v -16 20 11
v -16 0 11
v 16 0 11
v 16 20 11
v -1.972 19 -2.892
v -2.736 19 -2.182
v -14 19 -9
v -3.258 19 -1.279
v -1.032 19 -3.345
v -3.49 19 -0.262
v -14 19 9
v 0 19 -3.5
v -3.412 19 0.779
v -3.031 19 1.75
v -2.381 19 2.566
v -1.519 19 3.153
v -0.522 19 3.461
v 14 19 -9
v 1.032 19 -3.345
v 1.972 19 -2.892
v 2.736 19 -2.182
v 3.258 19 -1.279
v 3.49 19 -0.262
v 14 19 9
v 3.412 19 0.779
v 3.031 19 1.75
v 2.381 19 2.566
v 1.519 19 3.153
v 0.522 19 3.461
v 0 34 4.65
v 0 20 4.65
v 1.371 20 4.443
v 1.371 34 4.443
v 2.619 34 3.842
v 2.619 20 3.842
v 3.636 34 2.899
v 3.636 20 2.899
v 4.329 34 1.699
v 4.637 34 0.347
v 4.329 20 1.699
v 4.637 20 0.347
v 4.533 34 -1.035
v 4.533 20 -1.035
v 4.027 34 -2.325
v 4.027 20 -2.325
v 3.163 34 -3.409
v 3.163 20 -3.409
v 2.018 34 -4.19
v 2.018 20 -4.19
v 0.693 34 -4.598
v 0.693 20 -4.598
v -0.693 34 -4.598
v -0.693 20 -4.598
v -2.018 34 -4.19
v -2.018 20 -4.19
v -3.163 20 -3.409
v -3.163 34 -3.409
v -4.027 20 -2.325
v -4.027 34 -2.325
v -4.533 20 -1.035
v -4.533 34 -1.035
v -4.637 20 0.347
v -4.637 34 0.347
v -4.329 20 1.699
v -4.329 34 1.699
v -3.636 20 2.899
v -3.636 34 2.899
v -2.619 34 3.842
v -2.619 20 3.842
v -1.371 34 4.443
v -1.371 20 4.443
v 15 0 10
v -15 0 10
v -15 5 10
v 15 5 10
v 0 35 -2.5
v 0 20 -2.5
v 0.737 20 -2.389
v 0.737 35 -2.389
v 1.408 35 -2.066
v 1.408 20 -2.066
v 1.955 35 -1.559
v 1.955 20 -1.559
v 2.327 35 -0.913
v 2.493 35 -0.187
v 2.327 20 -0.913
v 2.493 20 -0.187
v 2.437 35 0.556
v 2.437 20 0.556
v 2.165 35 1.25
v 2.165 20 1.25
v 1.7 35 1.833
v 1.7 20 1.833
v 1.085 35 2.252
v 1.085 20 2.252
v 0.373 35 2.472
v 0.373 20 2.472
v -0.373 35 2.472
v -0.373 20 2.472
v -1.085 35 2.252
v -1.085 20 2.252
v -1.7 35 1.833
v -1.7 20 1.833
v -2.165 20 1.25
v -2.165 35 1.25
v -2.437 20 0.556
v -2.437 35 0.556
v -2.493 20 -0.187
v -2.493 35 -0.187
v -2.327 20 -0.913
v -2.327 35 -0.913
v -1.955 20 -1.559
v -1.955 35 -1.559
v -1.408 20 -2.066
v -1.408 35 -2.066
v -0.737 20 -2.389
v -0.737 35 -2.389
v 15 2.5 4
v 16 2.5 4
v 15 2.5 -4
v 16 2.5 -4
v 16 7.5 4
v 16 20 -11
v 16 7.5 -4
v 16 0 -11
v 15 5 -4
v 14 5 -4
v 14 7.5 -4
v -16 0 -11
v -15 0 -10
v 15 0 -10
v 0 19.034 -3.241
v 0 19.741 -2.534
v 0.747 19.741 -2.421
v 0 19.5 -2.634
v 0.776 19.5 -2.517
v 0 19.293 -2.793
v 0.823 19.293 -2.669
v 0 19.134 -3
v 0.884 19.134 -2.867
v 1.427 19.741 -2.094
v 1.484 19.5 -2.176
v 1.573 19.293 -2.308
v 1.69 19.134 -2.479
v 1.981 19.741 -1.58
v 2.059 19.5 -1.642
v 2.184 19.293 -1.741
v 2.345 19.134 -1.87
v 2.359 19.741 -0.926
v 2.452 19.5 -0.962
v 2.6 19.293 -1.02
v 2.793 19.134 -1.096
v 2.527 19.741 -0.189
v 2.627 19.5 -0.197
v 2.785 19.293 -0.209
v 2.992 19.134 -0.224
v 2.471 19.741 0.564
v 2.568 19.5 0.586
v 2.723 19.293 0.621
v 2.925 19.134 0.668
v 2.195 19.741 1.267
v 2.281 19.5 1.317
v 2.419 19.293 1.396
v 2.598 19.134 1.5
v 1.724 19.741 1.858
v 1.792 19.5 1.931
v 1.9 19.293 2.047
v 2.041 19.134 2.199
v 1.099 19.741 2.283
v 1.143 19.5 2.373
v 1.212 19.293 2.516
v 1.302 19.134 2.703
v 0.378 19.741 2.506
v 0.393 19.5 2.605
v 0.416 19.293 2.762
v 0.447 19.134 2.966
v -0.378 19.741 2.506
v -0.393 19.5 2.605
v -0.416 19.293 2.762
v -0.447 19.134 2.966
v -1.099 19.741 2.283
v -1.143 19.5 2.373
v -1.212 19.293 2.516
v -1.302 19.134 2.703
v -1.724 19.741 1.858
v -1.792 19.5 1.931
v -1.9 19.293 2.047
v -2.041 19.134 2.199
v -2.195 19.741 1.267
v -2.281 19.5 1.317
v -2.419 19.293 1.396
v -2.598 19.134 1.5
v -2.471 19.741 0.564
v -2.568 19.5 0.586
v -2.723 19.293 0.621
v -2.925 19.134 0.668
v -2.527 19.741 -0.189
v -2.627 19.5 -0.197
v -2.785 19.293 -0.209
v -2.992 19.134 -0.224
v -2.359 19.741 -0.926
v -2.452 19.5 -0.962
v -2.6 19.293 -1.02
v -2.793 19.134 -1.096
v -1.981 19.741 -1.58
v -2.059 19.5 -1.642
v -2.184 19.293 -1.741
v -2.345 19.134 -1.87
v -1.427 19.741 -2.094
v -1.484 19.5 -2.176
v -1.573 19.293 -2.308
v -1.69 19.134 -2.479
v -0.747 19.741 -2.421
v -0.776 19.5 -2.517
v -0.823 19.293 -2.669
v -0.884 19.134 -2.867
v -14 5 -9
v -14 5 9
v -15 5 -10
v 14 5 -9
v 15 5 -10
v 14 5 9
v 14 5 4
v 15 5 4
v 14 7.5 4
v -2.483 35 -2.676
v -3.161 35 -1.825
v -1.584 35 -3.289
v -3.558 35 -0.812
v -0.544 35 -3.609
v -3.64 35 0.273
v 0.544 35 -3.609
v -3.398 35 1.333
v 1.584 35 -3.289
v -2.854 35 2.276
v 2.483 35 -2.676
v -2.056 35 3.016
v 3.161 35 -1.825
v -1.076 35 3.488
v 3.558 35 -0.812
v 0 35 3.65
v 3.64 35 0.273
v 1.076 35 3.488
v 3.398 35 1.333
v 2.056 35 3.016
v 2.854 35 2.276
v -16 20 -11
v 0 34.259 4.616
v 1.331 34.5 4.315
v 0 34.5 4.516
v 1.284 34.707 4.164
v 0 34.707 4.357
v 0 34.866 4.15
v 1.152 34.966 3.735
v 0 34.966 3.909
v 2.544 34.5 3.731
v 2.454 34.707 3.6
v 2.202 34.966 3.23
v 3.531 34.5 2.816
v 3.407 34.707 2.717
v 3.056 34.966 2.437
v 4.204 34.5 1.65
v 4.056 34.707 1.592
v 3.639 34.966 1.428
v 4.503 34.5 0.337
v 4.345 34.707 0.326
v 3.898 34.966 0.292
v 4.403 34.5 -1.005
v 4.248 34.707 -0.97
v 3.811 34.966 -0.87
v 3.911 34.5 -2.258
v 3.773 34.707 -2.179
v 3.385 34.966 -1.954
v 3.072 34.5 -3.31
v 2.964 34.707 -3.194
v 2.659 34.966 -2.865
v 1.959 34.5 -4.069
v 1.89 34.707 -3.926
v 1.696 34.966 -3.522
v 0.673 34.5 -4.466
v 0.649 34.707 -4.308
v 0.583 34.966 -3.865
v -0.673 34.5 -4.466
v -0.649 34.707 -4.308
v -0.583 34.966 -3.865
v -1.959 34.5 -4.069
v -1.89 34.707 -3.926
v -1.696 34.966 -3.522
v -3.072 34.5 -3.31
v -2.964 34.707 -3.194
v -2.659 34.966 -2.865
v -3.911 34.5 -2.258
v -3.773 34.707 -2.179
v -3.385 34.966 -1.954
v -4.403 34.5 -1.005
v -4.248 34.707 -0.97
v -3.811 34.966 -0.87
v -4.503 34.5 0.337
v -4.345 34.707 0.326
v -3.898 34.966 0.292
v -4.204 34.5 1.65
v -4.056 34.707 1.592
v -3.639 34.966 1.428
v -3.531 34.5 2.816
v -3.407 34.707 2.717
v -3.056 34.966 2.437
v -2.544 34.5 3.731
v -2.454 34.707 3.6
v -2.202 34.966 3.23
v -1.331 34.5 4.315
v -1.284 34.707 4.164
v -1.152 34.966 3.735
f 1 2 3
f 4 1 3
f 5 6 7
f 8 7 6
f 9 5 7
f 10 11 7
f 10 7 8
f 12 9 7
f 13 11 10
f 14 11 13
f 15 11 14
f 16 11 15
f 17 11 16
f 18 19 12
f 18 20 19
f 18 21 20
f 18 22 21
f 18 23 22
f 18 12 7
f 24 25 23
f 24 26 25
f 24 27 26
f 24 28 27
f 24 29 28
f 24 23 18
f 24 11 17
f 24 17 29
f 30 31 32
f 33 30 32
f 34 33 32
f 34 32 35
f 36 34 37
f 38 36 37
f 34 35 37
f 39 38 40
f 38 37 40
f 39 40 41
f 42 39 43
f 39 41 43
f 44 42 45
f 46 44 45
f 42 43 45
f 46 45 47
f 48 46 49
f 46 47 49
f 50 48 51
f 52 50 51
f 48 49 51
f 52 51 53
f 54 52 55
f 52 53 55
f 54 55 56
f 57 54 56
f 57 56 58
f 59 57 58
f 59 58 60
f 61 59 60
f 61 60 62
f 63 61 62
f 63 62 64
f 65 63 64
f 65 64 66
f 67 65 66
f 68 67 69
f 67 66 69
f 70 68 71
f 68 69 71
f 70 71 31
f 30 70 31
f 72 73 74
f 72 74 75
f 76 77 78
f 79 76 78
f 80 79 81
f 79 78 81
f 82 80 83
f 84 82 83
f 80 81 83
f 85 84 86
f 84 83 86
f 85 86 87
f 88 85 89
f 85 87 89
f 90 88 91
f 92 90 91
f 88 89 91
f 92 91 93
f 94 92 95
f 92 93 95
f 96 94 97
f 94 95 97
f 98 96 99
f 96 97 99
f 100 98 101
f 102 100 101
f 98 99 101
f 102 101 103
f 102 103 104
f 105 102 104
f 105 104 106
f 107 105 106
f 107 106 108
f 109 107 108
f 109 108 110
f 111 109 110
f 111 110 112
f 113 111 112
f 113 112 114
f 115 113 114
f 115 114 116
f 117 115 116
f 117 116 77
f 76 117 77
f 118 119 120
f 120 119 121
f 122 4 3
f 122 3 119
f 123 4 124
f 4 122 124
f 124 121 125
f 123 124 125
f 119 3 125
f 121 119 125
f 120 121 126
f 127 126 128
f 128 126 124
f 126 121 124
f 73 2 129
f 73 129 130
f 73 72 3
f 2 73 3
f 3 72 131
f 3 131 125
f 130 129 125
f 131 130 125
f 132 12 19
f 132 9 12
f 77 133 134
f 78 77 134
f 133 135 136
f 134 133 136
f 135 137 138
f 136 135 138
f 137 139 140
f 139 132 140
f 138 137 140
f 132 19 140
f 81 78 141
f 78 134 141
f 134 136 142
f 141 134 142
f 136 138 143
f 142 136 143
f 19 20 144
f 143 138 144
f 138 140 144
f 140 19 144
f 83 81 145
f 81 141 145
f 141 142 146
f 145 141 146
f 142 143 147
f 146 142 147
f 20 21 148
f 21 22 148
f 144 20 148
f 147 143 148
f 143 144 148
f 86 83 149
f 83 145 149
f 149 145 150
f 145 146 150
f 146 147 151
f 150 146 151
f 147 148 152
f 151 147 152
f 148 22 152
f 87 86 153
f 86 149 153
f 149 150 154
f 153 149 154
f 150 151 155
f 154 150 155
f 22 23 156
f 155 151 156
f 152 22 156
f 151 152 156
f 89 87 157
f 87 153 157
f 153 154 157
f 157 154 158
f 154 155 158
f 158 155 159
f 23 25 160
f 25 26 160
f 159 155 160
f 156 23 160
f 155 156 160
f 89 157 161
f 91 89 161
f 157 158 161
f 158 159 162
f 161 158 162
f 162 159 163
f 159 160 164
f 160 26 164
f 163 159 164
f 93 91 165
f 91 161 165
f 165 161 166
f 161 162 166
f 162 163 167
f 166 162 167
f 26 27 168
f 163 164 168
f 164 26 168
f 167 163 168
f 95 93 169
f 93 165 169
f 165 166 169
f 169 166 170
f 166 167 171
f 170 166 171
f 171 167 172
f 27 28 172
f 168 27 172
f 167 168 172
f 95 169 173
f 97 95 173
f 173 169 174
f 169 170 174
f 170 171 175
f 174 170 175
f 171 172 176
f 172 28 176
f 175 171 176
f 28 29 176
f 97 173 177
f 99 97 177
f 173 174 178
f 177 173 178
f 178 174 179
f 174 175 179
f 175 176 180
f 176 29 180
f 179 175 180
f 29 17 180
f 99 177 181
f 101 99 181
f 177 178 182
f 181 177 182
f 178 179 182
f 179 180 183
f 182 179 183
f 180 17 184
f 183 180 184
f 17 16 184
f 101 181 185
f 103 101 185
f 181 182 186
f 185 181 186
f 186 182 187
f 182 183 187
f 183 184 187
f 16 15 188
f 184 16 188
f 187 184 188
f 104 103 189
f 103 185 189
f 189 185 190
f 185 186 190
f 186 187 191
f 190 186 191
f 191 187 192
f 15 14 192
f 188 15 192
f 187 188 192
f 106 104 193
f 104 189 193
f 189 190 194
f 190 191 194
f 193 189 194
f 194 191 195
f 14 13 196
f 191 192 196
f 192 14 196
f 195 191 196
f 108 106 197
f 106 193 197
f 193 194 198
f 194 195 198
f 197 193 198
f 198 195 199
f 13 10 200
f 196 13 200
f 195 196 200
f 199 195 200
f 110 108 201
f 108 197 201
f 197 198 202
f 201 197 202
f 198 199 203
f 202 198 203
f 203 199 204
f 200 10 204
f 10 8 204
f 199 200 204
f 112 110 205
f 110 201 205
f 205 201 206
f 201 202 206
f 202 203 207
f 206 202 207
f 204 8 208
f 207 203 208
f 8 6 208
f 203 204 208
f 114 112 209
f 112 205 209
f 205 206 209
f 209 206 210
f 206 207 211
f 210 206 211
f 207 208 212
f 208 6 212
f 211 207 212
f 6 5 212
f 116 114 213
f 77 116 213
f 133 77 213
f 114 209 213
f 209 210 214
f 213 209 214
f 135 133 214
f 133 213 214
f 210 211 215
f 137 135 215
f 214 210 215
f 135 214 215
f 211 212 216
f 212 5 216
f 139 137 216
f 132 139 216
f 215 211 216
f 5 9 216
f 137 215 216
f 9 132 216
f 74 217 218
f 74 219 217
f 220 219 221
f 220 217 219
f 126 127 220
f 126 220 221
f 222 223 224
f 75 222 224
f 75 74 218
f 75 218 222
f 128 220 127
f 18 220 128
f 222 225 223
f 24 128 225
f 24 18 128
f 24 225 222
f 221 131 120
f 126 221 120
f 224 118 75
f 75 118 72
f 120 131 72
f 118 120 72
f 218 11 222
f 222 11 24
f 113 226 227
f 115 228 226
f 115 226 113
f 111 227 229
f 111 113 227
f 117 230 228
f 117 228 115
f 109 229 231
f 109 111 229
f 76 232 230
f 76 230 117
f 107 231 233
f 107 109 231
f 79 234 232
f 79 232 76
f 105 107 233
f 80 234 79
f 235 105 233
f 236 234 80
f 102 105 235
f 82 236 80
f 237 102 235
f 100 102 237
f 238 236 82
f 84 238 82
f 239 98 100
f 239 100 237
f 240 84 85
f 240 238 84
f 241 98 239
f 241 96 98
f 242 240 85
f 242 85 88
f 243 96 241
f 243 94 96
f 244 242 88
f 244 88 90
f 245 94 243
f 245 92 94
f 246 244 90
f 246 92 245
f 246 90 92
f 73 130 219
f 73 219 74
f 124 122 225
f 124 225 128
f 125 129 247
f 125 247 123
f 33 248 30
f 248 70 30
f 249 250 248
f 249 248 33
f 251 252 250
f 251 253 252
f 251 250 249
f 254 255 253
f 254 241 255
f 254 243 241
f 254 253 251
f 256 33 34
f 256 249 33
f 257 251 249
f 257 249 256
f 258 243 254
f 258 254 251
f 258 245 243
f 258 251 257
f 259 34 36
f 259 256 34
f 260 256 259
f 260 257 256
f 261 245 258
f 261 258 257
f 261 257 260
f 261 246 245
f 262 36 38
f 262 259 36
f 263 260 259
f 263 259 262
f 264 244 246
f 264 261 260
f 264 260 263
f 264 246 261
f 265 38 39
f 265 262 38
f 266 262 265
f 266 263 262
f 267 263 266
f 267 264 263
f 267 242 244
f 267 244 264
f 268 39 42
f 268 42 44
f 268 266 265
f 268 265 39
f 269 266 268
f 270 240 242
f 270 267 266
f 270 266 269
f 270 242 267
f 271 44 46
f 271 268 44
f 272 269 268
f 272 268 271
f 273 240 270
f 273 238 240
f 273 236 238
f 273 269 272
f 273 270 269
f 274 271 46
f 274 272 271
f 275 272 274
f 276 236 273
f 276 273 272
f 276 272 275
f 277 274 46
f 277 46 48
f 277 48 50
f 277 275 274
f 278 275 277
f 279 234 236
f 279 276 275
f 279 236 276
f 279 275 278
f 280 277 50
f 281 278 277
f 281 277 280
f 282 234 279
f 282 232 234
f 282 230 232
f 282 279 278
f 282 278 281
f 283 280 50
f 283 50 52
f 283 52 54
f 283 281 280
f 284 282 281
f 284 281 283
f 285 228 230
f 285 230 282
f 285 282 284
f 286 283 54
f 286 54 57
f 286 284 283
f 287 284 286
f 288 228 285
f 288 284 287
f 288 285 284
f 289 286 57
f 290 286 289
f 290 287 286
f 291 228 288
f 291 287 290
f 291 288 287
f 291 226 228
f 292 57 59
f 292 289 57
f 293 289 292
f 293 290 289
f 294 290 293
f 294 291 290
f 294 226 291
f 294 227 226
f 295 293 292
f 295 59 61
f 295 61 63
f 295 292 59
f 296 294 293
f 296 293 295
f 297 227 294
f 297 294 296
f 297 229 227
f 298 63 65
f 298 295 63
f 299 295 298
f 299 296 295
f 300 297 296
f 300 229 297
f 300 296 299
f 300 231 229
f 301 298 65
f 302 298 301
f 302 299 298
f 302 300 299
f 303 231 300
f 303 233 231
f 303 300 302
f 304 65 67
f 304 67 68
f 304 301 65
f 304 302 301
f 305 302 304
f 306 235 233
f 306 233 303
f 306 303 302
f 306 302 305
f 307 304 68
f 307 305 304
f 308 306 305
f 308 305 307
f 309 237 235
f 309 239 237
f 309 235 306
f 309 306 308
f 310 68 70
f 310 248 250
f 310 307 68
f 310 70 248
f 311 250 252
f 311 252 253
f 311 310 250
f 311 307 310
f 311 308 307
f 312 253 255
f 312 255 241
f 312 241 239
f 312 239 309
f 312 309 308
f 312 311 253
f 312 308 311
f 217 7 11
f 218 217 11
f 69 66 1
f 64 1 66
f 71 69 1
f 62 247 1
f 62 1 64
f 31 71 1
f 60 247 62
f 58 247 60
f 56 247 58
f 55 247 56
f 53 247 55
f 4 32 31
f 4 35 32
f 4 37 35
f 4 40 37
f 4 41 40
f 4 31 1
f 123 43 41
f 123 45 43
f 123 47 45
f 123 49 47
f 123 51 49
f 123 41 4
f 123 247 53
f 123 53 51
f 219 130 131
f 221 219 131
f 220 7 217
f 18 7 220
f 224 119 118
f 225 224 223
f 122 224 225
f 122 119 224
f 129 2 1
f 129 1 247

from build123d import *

# Parameters (mm, degrees)
SKETCH1_W           = 32
SKETCH1_H           = 22
BOSS_EXTRUDE1_DEPTH = 20
SKETCH2_R           = 4.65
BOSS_EXTRUDE2_DEPTH = 15
SKETCH3_W           = 30
SKETCH3_H           = 20
CUT_EXTRUDE1_DEPTH  = 19
SKETCH4_R           = 2.5
CUT_EXTRUDE2_DEPTH  = 28.166155414
FILLET1_R           = 1
FILLET2_R           = 1
SKETCH5_W           = 30
SKETCH5_H           = 20
SKETCH5_W_2         = 28
SKETCH5_H_2         = 18
BOSS_EXTRUDE3_DEPTH = 14
CUT_EXTRUDE3_REACH  = 50.683
SKETCH8_W           = 8
SKETCH8_H           = 5


with BuildPart() as part:
    # Sketch1 → Boss-Extrude1 (new body)
    with BuildSketch(Plane(origin=(0, 0, 0), x_dir=(1, 0, 0), z_dir=(0, 1, 0))):
        Rectangle(SKETCH1_W, SKETCH1_H)
    extrude(amount=BOSS_EXTRUDE1_DEPTH)

    # Sketch2 → Boss-Extrude2 (add)
    with BuildSketch(Plane(origin=(0, 20, 0), x_dir=(1, 0, 0), z_dir=(0, 1, 0))):
        with Locations(Location((0, 0, 0), (0, 0, 270))):
            Circle(SKETCH2_R)
    extrude(amount=BOSS_EXTRUDE2_DEPTH)

    # Sketch3 → Cut-Extrude1 (cut)
    with BuildSketch(Plane.XZ):
        Rectangle(SKETCH3_W, SKETCH3_H)
    extrude(amount=-CUT_EXTRUDE1_DEPTH, mode=Mode.SUBTRACT)

    # Sketch4 → Cut-Extrude2 (cut, through all)
    with BuildSketch(Plane.XZ.offset(-19)):
        with Locations(Location((0, 0, 0), (0, 0, 270))):
            Circle(SKETCH4_R)
    extrude(amount=-CUT_EXTRUDE2_DEPTH, mode=Mode.SUBTRACT)

    # Fillet1
    fillet1_edges = [part.edges().sort_by_distance(p)[0] for p in [
        (0, 35, -4.65),
    ]]
    fillet(fillet1_edges, radius=FILLET1_R)

    # Fillet2
    fillet2_edges = [part.edges().sort_by_distance(p)[0] for p in [
        (0, 19, 2.5),
    ]]
    fillet(fillet2_edges, radius=FILLET2_R)

    # Sketch5 → Boss-Extrude3 (add)
    with BuildSketch(Plane.XZ.offset(-19)):
        Rectangle(SKETCH5_W, SKETCH5_H)
        Rectangle(SKETCH5_W_2, SKETCH5_H_2, mode=Mode.SUBTRACT)
    extrude(amount=BOSS_EXTRUDE3_DEPTH)

    # Cut-Extrude3: up to this face of the body (flat: up to its plane)
    cut_extrude3_end = Plane(part.part.faces().sort_by_distance((14, 12, 0))[0])
    # Sketch8 → Cut-Extrude3 (cut, up to the picked face)
    with BuildSketch(Plane(origin=(16, 0, 0), x_dir=(0, 0, -1), z_dir=(1, 0, 0)), mode=Mode.PRIVATE) as cut_extrude3_sk1:
        with Locations((0, 5)):
            Rectangle(SKETCH8_W, SKETCH8_H)
    cut_extrude3_tool1 = split(extrude(cut_extrude3_sk1.sketch, amount=-CUT_EXTRUDE3_REACH, mode=Mode.PRIVATE), bisect_by=cut_extrude3_end, keep=Keep.BOTH, mode=Mode.PRIVATE)
    add(cut_extrude3_tool1.solids().sort_by(Axis((16, 5, 0), (-1, 0, 0)))[0], mode=Mode.SUBTRACT)


solid = part.part
